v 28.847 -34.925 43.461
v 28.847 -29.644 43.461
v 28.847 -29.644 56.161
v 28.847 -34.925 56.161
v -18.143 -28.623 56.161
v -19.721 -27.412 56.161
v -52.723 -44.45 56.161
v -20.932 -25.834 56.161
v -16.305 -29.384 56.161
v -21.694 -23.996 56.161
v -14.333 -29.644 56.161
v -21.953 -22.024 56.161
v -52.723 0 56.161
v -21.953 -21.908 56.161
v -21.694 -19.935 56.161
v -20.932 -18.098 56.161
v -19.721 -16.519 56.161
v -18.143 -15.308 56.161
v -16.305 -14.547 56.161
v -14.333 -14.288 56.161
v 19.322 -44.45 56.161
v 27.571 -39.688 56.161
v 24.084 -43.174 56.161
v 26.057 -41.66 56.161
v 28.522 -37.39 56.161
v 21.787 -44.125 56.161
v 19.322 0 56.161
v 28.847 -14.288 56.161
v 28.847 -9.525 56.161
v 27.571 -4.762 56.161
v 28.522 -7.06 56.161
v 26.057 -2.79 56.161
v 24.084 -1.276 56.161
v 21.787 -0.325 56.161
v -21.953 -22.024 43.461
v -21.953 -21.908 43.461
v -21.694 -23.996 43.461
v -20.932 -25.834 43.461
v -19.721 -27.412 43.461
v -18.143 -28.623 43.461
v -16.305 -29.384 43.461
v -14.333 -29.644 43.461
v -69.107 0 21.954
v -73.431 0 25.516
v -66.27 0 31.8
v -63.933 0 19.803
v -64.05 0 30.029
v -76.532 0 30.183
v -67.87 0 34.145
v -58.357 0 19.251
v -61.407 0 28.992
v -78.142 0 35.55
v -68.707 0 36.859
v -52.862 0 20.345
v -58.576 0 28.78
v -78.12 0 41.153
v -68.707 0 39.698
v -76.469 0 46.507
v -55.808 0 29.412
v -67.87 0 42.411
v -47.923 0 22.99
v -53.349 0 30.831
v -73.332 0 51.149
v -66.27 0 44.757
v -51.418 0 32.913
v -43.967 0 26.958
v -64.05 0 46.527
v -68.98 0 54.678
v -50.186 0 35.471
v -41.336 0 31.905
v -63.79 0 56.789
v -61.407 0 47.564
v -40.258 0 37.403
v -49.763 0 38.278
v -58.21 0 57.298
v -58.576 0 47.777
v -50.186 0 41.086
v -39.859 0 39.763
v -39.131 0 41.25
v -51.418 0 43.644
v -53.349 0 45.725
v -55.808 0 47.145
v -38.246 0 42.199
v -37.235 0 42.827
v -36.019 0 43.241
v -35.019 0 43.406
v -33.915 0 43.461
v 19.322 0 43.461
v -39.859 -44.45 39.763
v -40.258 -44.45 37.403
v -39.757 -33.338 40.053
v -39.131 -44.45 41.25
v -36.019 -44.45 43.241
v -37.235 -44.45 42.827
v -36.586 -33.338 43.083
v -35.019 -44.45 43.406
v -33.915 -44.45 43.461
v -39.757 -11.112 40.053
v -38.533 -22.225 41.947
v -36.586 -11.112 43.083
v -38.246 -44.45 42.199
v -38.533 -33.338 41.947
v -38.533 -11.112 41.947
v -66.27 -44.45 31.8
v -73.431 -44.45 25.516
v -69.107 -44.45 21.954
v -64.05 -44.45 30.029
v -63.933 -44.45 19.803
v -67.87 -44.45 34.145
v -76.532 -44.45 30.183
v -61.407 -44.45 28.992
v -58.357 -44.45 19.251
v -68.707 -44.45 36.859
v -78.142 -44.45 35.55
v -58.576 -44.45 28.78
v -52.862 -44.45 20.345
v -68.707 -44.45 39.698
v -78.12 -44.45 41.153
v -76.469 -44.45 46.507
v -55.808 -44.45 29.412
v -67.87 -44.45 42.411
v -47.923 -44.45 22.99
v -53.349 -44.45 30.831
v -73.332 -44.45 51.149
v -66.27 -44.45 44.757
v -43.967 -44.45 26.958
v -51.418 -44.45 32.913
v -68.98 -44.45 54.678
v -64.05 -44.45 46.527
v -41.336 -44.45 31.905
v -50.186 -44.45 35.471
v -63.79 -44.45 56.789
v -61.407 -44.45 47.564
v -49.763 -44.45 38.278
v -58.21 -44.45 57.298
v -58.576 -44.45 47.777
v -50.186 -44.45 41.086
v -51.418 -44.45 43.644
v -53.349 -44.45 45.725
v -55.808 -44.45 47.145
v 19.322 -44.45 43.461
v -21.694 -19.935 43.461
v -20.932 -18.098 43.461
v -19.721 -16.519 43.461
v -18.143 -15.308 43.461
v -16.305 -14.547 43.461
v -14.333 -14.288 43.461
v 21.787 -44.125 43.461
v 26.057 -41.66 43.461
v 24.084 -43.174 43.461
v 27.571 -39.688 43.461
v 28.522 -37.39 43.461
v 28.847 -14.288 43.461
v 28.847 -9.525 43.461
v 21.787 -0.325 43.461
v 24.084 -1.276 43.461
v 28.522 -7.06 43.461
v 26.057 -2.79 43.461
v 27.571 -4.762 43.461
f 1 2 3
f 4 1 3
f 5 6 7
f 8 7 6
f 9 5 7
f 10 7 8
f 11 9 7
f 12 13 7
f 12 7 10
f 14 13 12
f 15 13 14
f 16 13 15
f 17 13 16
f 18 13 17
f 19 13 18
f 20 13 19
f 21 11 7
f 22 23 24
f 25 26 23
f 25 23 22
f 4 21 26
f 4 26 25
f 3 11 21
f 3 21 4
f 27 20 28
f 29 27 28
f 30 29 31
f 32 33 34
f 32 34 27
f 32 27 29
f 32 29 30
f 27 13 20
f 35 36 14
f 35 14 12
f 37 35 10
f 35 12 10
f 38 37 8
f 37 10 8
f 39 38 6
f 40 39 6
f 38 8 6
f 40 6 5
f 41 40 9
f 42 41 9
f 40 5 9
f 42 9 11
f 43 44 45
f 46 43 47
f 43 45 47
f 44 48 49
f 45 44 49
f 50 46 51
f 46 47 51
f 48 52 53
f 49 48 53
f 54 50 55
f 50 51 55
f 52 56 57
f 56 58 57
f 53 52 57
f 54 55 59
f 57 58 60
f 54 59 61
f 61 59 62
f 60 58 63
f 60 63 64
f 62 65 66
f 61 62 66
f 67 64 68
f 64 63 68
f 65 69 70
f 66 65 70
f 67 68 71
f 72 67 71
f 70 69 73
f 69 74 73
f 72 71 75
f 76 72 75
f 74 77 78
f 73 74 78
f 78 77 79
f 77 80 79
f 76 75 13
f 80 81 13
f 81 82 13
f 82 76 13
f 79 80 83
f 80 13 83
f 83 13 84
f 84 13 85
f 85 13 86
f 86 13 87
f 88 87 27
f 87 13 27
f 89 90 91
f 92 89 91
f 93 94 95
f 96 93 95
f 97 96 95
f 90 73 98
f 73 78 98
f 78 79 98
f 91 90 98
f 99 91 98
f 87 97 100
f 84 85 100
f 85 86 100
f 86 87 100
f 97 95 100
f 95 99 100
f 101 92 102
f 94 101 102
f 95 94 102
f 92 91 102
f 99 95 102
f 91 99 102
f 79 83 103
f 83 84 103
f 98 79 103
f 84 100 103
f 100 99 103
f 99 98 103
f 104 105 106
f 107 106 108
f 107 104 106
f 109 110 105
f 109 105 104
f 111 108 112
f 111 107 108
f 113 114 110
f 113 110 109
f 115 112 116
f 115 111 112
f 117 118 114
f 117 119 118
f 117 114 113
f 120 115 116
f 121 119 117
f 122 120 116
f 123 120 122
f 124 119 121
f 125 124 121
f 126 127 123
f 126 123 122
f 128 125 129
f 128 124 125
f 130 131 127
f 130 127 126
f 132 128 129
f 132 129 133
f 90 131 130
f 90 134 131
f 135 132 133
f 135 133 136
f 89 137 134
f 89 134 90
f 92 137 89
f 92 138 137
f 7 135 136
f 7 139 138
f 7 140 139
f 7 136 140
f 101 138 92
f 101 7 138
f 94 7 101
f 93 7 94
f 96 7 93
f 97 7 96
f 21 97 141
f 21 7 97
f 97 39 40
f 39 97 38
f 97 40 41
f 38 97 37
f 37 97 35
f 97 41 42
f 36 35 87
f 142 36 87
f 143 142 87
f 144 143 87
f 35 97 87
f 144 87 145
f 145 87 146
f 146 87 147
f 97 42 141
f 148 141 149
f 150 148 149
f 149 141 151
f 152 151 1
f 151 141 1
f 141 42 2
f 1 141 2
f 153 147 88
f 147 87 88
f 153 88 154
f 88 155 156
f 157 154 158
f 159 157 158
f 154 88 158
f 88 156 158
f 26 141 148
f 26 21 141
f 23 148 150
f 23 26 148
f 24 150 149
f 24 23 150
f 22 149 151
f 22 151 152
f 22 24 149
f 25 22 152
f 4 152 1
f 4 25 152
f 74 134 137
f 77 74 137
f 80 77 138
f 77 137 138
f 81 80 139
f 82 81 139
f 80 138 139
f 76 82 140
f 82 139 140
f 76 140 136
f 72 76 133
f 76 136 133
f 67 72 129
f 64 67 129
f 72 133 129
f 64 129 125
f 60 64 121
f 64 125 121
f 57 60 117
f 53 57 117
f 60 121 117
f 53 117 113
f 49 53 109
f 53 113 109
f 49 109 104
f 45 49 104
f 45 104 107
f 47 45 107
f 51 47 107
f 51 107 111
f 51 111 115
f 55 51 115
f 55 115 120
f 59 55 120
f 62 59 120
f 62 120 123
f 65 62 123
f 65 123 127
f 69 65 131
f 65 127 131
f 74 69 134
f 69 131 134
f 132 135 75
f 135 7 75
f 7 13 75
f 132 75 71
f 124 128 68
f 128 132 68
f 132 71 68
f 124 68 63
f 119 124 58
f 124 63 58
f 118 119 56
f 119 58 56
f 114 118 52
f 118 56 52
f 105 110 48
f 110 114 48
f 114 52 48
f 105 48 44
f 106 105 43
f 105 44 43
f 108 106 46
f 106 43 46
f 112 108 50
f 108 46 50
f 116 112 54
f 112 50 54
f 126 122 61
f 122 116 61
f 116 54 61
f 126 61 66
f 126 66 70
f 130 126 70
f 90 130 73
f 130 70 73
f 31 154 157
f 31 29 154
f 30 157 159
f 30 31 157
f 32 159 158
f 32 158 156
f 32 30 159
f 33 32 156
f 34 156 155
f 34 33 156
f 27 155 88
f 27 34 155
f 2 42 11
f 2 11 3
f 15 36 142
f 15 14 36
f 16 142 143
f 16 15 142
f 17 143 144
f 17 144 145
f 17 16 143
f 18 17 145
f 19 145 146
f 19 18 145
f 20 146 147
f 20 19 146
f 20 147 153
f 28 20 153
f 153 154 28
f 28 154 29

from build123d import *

# Parameters (mm, degrees)
F0_R        = 19.05
F1_DEPTH    = 44.45
F2_W        = 88.9
F2_H        = 12.7
F3_DEPTH    = 44.45
F4_T1_DEPTH = 44.45
F5_R        = 9.525
F6_DEPTH    = 44.45
F7_W        = 50.8
F7_H        = 15.3564938247
F8_DEPTH    = 12.7
F9_R        = 7.62
F10_R       = 7.62
F11_R       = 9.525
F12_R       = 9.525


# Not quite as in the source:
# - a fillet or chamfer that OpenCascade refuses, or shapes differently, is made with other operations: its cross-section is extruded or revolved along the edge and cut away or added


with BuildPart() as f1:
    # F0 (on Front) → F1 (new body)
    with BuildSketch(Plane.XZ):
        with Locations((-59.2879876494, 38.2781662047)):
            Circle(F0_R)
    extrude(amount=F1_DEPTH)

    # F2 (on Front) → F3 (join)
    with BuildSketch(Plane.XZ):
        with Locations((-15.6031847, 49.8112538493)):
            Rectangle(F2_W, F2_H)
    extrude(amount=F3_DEPTH)

    # F4: fillet of radius 6.35 on 1 edges, made by hand

    # F4_s2 → F4_t1 (join)
    with BuildSketch(Plane.XZ):
        with BuildLine():
            add(Edge.make_bspline(
                [(-40.2581018773, 37.4029819382), (-39.9794820095, 43.4612538493), (-33.91480662, 43.4612538493)],
                knots=[0, 0, 0, 1, 1, 1], degree=2, weights=[1, 1, 1]))
            Line((-33.91480662, 43.4612538493), (-40.9566455691, 43.4612538493))
            ThreePointArc((-40.9566455691, 43.4612538493), (-40.3633740127, 40.4602520649), (-40.2581018773, 37.4029819382))
        make_face()
    extrude(amount=F4_T1_DEPTH)

    # F5 (on face) → F6 (cut)
    with BuildSketch(Plane.XZ.offset(44.45)):
        with Locations((-59.2879876494, 38.2781662047)):
            Circle(F5_R)
    extrude(amount=-F6_DEPTH, mode=Mode.SUBTRACT)

    # F7 (on face) → F8 (cut)
    with BuildSketch(Plane(origin=(0, 0, 43.4612538493), x_dir=(1, 0, 0), z_dir=(0, 0, -1))):
        with Locations((3.4468153, 21.9657469124)):
            Rectangle(F7_W, F7_H)
    extrude(amount=-F8_DEPTH, mode=Mode.SUBTRACT)

    # F9
    f9_edges = [f1.edges().sort_by_distance(p)[0] for p in [
        (-21.953185, -29.643994, 49.811254),
    ]]
    fillet(f9_edges, radius=F9_R)

    # F10
    f10_edges = [f1.edges().sort_by_distance(p)[0] for p in [
        (-21.953185, -14.2875, 49.811254),
    ]]
    fillet(f10_edges, radius=F10_R)

    # F11
    f11_edges = [f1.edges().sort_by_distance(p)[0] for p in [
        (28.846815, 0, 49.811254),
    ]]
    fillet(f11_edges, radius=F11_R)

    # F12
    f12_edges = [f1.edges().sort_by_distance(p)[0] for p in [
        (28.846815, -44.45, 49.811254),
    ]]
    fillet(f12_edges, radius=F12_R)


solid = f1.part
